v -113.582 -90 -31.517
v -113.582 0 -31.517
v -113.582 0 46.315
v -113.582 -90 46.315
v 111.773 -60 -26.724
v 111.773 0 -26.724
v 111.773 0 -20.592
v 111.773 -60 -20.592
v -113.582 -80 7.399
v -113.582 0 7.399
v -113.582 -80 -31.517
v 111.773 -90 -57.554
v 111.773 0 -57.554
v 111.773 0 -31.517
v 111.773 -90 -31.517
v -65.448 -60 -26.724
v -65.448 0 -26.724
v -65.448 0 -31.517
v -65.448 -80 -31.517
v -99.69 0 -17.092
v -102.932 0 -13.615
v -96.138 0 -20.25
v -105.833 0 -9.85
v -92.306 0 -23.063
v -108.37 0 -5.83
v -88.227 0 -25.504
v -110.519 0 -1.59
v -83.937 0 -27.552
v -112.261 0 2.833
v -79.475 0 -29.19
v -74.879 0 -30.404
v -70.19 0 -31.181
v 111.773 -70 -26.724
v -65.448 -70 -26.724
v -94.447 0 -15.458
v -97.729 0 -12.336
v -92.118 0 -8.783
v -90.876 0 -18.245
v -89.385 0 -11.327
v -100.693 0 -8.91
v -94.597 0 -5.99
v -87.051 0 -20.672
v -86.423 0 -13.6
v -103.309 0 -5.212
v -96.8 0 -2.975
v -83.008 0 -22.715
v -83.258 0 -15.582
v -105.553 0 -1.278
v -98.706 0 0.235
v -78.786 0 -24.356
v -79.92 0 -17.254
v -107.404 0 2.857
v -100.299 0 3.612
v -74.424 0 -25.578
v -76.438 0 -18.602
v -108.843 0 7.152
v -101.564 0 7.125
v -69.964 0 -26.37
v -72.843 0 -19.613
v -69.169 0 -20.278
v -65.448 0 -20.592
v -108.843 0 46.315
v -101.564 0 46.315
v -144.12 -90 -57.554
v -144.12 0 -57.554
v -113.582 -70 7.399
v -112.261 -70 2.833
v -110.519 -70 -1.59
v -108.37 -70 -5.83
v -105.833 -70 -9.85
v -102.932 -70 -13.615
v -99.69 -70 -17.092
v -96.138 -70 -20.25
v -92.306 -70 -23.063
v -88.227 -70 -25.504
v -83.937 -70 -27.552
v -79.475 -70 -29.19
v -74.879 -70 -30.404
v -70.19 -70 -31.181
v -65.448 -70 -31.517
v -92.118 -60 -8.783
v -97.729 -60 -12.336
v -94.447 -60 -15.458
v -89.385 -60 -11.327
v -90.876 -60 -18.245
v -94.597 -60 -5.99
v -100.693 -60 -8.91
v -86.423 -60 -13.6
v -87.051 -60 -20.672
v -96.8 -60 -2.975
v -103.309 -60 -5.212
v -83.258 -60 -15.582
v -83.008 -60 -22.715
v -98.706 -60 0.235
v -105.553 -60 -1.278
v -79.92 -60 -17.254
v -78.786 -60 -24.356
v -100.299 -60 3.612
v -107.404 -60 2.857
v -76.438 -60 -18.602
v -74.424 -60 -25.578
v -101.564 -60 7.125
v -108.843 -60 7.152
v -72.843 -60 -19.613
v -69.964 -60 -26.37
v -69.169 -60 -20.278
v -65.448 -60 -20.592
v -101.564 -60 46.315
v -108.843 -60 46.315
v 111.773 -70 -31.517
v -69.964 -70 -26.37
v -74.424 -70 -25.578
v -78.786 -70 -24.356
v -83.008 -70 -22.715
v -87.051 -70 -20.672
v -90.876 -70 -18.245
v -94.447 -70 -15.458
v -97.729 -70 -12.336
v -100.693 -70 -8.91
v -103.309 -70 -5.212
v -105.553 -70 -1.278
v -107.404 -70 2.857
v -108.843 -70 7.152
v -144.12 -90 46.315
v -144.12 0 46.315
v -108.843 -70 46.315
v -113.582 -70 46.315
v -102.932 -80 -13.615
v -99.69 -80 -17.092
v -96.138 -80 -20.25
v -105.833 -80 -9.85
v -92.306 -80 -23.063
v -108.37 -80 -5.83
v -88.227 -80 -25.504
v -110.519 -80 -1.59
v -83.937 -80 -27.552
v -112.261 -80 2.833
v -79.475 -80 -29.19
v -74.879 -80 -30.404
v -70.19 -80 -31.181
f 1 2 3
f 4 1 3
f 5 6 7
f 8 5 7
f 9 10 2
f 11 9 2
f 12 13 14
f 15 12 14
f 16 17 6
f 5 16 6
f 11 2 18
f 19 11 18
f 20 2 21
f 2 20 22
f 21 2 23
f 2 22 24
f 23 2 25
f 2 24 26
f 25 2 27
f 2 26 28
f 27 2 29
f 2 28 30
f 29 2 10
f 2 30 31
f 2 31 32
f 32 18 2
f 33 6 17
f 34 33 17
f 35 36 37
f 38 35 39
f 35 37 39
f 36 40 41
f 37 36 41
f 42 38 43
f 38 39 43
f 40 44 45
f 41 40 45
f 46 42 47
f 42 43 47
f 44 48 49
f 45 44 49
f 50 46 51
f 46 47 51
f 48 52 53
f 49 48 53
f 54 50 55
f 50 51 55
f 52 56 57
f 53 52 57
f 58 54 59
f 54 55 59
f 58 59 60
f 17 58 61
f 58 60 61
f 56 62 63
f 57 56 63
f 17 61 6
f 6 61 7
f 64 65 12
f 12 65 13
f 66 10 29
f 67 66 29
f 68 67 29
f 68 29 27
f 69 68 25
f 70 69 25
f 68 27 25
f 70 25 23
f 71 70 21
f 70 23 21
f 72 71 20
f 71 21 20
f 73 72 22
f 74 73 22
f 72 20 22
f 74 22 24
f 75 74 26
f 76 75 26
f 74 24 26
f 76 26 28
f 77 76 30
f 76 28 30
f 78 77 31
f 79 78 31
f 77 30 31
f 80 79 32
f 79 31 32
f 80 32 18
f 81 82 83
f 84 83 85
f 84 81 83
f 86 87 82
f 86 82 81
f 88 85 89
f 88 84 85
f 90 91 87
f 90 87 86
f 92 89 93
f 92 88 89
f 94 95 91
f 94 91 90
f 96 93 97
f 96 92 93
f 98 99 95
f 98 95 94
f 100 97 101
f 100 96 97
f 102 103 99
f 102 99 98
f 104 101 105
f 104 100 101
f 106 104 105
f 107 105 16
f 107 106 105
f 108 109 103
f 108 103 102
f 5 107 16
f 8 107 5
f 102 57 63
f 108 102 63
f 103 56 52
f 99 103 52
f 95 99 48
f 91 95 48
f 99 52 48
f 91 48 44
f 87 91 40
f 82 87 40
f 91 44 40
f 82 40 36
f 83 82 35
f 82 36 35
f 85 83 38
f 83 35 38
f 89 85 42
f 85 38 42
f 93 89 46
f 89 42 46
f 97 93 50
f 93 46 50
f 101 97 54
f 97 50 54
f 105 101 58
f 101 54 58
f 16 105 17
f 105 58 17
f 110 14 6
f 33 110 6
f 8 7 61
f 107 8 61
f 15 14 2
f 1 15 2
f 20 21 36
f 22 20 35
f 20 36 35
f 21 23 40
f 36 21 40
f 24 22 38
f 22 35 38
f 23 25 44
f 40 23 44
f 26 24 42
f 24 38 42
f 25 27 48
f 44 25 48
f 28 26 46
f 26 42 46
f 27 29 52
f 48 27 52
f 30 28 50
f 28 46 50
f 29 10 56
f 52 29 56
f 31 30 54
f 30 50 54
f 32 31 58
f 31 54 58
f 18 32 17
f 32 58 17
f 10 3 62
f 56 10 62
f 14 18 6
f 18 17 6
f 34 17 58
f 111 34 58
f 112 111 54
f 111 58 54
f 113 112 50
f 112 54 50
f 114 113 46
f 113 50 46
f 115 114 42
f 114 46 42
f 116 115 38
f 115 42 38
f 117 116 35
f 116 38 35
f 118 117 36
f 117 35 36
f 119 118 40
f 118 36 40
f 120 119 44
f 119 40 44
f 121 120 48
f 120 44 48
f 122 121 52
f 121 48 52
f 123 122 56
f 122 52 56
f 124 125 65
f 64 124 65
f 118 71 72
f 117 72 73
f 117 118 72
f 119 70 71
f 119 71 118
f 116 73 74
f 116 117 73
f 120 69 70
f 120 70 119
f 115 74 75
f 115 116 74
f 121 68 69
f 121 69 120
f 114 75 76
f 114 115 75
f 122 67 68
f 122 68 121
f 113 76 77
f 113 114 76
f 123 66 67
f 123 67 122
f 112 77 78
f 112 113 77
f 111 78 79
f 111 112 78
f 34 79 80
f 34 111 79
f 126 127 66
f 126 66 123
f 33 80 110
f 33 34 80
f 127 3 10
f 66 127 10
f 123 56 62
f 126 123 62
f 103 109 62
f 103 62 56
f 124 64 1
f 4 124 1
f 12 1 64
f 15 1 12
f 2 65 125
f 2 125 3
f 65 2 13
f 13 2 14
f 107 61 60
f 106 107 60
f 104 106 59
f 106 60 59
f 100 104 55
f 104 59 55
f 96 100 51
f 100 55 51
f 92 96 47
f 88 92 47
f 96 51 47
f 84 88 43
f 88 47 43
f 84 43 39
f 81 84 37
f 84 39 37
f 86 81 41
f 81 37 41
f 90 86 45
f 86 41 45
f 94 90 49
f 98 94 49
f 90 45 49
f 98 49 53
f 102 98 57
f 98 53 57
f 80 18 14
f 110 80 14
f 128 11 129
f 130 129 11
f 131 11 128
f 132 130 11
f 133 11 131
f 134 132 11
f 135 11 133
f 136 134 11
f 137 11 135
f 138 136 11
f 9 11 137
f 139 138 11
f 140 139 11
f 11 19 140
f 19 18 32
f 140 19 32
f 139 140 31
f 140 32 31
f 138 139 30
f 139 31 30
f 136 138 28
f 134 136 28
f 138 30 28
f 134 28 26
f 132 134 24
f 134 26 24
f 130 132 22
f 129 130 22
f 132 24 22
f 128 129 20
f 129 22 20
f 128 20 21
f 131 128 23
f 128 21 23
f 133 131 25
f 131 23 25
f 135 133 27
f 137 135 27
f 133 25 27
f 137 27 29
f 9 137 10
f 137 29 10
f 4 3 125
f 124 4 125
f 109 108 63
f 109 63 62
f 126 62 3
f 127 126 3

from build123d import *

# Parameters (mm, degrees)
F1_DEPTH = 90
F2_DEPTH = 80
F3_DEPTH = 70
F4_DEPTH = 60


with BuildPart() as f1:
    # F0 (on Front) → F1 (new body)
    with BuildSketch(Plane.XZ):
        Polygon((-113.582407, 46.314746), (-144.119631, 46.314746), (-144.119631, -57.553977), (111.772585, -57.553977), (111.772585, -31.516805), (-65.44818, -31.516805), (-113.582407, -31.516805), (-113.582407, 7.398971), align=None)
    extrude(amount=F1_DEPTH)


with BuildPart() as f2:
    # F0 (on Front) → F2 (new body)
    with BuildSketch(Plane.XZ):
        with BuildLine():
            ThreePointArc((-65.44818, -31.516805), (-96.138059, -20.250497), (-113.582407, 7.398971))
            Line((-113.582407, 7.398971), (-113.582407, -31.516805))
            Line((-113.582407, -31.516805), (-65.44818, -31.516805))
        make_face()
    extrude(amount=F2_DEPTH)


with BuildPart() as f3:
    # F0 (on Front) → F3 (new body)
    with BuildSketch(Plane.XZ):
        with BuildLine():
            Line((-108.843474, 46.314746), (-113.582407, 46.314746))
            Line((-113.582407, 46.314746), (-113.582407, 7.398971))
            ThreePointArc((-113.582407, 7.398971), (-96.138059, -20.250497), (-65.44818, -31.516805))
            Line((-65.44818, -31.516805), (111.772585, -31.516805))
            Line((111.772585, -31.516805), (111.772585, -26.724496))
            Line((111.772585, -26.724496), (-65.44818, -26.724496))
            ThreePointArc((-65.44818, -26.724496), (-92.695132, -16.89495), (-108.843474, 7.151827))
            Line((-108.843474, 7.151827), (-108.843474, 46.314746))
        make_face()
    extrude(amount=F3_DEPTH)


with BuildPart() as f4:
    # F0 (on Front) → F4 (new body)
    with BuildSketch(Plane.XZ):
        with BuildLine():
            Line((-101.56425, 46.314746), (-108.843474, 46.314746))
            Line((-108.843474, 46.314746), (-108.843474, 7.151827))
            ThreePointArc((-108.843474, 7.151827), (-92.695132, -16.89495), (-65.44818, -26.724496))
            Line((-65.44818, -26.724496), (111.772585, -26.724496))
            Line((111.772585, -26.724496), (111.772585, -20.591593))
            Line((111.772585, -20.591593), (-65.448172, -20.591593))
            ThreePointArc((-65.448172, -20.591593), (-87.931071, -12.498825), (-101.56425, 7.125397))
            Line((-101.56425, 7.125397), (-101.56425, 46.314746))
        make_face()
    extrude(amount=F4_DEPTH)


solid = Compound([f1.part, f2.part, f3.part, f4.part])
